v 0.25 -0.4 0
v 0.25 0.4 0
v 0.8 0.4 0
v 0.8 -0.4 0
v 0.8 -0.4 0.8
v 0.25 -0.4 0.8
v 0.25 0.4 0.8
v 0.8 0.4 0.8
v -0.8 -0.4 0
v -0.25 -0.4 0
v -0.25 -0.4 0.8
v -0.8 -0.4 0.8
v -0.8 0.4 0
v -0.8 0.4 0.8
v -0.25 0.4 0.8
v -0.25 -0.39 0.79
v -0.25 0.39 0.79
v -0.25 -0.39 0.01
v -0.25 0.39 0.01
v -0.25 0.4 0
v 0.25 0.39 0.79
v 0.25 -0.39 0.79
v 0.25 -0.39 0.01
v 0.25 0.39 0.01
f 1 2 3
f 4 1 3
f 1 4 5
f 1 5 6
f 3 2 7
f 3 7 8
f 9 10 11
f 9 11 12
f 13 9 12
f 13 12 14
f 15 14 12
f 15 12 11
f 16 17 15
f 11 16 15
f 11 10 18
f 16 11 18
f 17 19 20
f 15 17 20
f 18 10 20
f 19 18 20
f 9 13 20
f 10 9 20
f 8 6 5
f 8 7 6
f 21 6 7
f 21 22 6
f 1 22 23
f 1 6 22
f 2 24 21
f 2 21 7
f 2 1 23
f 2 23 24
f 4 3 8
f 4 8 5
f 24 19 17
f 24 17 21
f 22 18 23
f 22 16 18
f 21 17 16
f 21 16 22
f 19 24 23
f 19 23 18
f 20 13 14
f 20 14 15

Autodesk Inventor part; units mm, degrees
ref_plane "YZ Plane" through (0, 0, 0) normal (1, 0, 0) x (0, 1, 0)
ref_plane "XZ Plane" through (0, 0, 0) normal (0, 1, 0) x (-1, 0, 0)
ref_plane "XY Plane" through (0, 0, 0) normal (0, 0, 1) x (1, 0, 0)
sketch "Эскиз1" plane through (0, 0, 0) normal (0, 0, 1) x (1, 0, 0)
  line L0 (-0.8, 0.4) -> (0.8, 0.4)
  line L1 (0.8, 0.4) -> (0.8, -0.4)
  line L2 (0.8, -0.4) -> (-0.8, -0.4)
  line L3 (-0.8, -0.4) -> (-0.8, 0.4)
  point P0 (0, 0)
  dimension "d0" = 1.6
  dimension "d1" = 0.8
  dimension "d2" = 0.8
  dimension "d3" = 0.8
  dimension "d4" = 0.4
  dimension "d5" = 0.4
extrude "Выдавливание1" add sketch "Эскиз1" along normal blind 0.8
sketch "Эскиз2" plane through (0, 0, 0.8) normal (0, 0, 1) x (1, 0, 0)
  line L0 (0.8, 0.4) -> (0.8, -0.4) projected
  line L1 (-0.8, 0.4) -> (0.8, 0.4) projected
  line L2 (-0.8, -0.4) -> (-0.8, 0.4) projected
  line L3 (0.8, -0.4) -> (-0.8, -0.4) projected
  line L4 (-0.25, 0.4) -> (-0.25, -0.4)
  line L5 (0.25, 0.4) -> (0.25, -0.4)
  point P0 (0, 0)
  dimension "d10" = 0.5
  dimension "d11" = 0.55
  dimension "d12" = 0.55
extrude "Выдавливание2" cut sketch "Эскиз2" against normal blind 0.01 contours L5 L3 L4 L1
sketch "Эскиз3" plane through (-0.8, -0.4, 0) normal (0, -1, 0) x (1, 0, 0)
  line L0 (1.6, 0) -> (0, 0) projected
  line L1 (1.05, 0.79) -> (0.55, 0.79) projected
  line L2 (0.55, 0.79) -> (0.55, 0)
  line L3 (1.05, 0.79) -> (1.05, 0)
  point P0 (0.8, 0)
extrude "Выдавливание3" cut sketch "Эскиз3" against normal blind 0.01
sketch "Эскиз4" plane through (0, 0, 0) normal (0, 0, -1) x (-1, 0, 0)
  line L0 (-0.25, -0.39) -> (0.25, -0.39) projected
  line L1 (0.8, 0.4) -> (-0.8, 0.4) projected
  line L2 (0.25, -0.39) -> (0.25, 0.4)
  line L3 (-0.25, -0.39) -> (-0.25, 0.4)
  point P0 (0, 0)
extrude "Выдавливание4" cut sketch "Эскиз4" against normal blind 0.01
sketch "Эскиз5" plane through (-0.8, 0.4, 0.8) normal (0, 1, 0) x (1, 0, 0)
  line L0 (0.55, 0.01) -> (1.05, 0.01) projected
  line L1 (1.05, 0.79) -> (0.55, 0.79) projected
  line L2 (0.55, 0.79) -> (0.55, 0.01)
  line L3 (1.05, 0.79) -> (1.05, 0.01)
  point P0 (0.8, 0.8)
extrude "Выдавливание5" cut sketch "Эскиз5" against normal blind 0.01
equation "\"d2\" = d3"
equation "\"d4\" = d5"
equation "\"d11\" = d12"
properties part number "0603"
